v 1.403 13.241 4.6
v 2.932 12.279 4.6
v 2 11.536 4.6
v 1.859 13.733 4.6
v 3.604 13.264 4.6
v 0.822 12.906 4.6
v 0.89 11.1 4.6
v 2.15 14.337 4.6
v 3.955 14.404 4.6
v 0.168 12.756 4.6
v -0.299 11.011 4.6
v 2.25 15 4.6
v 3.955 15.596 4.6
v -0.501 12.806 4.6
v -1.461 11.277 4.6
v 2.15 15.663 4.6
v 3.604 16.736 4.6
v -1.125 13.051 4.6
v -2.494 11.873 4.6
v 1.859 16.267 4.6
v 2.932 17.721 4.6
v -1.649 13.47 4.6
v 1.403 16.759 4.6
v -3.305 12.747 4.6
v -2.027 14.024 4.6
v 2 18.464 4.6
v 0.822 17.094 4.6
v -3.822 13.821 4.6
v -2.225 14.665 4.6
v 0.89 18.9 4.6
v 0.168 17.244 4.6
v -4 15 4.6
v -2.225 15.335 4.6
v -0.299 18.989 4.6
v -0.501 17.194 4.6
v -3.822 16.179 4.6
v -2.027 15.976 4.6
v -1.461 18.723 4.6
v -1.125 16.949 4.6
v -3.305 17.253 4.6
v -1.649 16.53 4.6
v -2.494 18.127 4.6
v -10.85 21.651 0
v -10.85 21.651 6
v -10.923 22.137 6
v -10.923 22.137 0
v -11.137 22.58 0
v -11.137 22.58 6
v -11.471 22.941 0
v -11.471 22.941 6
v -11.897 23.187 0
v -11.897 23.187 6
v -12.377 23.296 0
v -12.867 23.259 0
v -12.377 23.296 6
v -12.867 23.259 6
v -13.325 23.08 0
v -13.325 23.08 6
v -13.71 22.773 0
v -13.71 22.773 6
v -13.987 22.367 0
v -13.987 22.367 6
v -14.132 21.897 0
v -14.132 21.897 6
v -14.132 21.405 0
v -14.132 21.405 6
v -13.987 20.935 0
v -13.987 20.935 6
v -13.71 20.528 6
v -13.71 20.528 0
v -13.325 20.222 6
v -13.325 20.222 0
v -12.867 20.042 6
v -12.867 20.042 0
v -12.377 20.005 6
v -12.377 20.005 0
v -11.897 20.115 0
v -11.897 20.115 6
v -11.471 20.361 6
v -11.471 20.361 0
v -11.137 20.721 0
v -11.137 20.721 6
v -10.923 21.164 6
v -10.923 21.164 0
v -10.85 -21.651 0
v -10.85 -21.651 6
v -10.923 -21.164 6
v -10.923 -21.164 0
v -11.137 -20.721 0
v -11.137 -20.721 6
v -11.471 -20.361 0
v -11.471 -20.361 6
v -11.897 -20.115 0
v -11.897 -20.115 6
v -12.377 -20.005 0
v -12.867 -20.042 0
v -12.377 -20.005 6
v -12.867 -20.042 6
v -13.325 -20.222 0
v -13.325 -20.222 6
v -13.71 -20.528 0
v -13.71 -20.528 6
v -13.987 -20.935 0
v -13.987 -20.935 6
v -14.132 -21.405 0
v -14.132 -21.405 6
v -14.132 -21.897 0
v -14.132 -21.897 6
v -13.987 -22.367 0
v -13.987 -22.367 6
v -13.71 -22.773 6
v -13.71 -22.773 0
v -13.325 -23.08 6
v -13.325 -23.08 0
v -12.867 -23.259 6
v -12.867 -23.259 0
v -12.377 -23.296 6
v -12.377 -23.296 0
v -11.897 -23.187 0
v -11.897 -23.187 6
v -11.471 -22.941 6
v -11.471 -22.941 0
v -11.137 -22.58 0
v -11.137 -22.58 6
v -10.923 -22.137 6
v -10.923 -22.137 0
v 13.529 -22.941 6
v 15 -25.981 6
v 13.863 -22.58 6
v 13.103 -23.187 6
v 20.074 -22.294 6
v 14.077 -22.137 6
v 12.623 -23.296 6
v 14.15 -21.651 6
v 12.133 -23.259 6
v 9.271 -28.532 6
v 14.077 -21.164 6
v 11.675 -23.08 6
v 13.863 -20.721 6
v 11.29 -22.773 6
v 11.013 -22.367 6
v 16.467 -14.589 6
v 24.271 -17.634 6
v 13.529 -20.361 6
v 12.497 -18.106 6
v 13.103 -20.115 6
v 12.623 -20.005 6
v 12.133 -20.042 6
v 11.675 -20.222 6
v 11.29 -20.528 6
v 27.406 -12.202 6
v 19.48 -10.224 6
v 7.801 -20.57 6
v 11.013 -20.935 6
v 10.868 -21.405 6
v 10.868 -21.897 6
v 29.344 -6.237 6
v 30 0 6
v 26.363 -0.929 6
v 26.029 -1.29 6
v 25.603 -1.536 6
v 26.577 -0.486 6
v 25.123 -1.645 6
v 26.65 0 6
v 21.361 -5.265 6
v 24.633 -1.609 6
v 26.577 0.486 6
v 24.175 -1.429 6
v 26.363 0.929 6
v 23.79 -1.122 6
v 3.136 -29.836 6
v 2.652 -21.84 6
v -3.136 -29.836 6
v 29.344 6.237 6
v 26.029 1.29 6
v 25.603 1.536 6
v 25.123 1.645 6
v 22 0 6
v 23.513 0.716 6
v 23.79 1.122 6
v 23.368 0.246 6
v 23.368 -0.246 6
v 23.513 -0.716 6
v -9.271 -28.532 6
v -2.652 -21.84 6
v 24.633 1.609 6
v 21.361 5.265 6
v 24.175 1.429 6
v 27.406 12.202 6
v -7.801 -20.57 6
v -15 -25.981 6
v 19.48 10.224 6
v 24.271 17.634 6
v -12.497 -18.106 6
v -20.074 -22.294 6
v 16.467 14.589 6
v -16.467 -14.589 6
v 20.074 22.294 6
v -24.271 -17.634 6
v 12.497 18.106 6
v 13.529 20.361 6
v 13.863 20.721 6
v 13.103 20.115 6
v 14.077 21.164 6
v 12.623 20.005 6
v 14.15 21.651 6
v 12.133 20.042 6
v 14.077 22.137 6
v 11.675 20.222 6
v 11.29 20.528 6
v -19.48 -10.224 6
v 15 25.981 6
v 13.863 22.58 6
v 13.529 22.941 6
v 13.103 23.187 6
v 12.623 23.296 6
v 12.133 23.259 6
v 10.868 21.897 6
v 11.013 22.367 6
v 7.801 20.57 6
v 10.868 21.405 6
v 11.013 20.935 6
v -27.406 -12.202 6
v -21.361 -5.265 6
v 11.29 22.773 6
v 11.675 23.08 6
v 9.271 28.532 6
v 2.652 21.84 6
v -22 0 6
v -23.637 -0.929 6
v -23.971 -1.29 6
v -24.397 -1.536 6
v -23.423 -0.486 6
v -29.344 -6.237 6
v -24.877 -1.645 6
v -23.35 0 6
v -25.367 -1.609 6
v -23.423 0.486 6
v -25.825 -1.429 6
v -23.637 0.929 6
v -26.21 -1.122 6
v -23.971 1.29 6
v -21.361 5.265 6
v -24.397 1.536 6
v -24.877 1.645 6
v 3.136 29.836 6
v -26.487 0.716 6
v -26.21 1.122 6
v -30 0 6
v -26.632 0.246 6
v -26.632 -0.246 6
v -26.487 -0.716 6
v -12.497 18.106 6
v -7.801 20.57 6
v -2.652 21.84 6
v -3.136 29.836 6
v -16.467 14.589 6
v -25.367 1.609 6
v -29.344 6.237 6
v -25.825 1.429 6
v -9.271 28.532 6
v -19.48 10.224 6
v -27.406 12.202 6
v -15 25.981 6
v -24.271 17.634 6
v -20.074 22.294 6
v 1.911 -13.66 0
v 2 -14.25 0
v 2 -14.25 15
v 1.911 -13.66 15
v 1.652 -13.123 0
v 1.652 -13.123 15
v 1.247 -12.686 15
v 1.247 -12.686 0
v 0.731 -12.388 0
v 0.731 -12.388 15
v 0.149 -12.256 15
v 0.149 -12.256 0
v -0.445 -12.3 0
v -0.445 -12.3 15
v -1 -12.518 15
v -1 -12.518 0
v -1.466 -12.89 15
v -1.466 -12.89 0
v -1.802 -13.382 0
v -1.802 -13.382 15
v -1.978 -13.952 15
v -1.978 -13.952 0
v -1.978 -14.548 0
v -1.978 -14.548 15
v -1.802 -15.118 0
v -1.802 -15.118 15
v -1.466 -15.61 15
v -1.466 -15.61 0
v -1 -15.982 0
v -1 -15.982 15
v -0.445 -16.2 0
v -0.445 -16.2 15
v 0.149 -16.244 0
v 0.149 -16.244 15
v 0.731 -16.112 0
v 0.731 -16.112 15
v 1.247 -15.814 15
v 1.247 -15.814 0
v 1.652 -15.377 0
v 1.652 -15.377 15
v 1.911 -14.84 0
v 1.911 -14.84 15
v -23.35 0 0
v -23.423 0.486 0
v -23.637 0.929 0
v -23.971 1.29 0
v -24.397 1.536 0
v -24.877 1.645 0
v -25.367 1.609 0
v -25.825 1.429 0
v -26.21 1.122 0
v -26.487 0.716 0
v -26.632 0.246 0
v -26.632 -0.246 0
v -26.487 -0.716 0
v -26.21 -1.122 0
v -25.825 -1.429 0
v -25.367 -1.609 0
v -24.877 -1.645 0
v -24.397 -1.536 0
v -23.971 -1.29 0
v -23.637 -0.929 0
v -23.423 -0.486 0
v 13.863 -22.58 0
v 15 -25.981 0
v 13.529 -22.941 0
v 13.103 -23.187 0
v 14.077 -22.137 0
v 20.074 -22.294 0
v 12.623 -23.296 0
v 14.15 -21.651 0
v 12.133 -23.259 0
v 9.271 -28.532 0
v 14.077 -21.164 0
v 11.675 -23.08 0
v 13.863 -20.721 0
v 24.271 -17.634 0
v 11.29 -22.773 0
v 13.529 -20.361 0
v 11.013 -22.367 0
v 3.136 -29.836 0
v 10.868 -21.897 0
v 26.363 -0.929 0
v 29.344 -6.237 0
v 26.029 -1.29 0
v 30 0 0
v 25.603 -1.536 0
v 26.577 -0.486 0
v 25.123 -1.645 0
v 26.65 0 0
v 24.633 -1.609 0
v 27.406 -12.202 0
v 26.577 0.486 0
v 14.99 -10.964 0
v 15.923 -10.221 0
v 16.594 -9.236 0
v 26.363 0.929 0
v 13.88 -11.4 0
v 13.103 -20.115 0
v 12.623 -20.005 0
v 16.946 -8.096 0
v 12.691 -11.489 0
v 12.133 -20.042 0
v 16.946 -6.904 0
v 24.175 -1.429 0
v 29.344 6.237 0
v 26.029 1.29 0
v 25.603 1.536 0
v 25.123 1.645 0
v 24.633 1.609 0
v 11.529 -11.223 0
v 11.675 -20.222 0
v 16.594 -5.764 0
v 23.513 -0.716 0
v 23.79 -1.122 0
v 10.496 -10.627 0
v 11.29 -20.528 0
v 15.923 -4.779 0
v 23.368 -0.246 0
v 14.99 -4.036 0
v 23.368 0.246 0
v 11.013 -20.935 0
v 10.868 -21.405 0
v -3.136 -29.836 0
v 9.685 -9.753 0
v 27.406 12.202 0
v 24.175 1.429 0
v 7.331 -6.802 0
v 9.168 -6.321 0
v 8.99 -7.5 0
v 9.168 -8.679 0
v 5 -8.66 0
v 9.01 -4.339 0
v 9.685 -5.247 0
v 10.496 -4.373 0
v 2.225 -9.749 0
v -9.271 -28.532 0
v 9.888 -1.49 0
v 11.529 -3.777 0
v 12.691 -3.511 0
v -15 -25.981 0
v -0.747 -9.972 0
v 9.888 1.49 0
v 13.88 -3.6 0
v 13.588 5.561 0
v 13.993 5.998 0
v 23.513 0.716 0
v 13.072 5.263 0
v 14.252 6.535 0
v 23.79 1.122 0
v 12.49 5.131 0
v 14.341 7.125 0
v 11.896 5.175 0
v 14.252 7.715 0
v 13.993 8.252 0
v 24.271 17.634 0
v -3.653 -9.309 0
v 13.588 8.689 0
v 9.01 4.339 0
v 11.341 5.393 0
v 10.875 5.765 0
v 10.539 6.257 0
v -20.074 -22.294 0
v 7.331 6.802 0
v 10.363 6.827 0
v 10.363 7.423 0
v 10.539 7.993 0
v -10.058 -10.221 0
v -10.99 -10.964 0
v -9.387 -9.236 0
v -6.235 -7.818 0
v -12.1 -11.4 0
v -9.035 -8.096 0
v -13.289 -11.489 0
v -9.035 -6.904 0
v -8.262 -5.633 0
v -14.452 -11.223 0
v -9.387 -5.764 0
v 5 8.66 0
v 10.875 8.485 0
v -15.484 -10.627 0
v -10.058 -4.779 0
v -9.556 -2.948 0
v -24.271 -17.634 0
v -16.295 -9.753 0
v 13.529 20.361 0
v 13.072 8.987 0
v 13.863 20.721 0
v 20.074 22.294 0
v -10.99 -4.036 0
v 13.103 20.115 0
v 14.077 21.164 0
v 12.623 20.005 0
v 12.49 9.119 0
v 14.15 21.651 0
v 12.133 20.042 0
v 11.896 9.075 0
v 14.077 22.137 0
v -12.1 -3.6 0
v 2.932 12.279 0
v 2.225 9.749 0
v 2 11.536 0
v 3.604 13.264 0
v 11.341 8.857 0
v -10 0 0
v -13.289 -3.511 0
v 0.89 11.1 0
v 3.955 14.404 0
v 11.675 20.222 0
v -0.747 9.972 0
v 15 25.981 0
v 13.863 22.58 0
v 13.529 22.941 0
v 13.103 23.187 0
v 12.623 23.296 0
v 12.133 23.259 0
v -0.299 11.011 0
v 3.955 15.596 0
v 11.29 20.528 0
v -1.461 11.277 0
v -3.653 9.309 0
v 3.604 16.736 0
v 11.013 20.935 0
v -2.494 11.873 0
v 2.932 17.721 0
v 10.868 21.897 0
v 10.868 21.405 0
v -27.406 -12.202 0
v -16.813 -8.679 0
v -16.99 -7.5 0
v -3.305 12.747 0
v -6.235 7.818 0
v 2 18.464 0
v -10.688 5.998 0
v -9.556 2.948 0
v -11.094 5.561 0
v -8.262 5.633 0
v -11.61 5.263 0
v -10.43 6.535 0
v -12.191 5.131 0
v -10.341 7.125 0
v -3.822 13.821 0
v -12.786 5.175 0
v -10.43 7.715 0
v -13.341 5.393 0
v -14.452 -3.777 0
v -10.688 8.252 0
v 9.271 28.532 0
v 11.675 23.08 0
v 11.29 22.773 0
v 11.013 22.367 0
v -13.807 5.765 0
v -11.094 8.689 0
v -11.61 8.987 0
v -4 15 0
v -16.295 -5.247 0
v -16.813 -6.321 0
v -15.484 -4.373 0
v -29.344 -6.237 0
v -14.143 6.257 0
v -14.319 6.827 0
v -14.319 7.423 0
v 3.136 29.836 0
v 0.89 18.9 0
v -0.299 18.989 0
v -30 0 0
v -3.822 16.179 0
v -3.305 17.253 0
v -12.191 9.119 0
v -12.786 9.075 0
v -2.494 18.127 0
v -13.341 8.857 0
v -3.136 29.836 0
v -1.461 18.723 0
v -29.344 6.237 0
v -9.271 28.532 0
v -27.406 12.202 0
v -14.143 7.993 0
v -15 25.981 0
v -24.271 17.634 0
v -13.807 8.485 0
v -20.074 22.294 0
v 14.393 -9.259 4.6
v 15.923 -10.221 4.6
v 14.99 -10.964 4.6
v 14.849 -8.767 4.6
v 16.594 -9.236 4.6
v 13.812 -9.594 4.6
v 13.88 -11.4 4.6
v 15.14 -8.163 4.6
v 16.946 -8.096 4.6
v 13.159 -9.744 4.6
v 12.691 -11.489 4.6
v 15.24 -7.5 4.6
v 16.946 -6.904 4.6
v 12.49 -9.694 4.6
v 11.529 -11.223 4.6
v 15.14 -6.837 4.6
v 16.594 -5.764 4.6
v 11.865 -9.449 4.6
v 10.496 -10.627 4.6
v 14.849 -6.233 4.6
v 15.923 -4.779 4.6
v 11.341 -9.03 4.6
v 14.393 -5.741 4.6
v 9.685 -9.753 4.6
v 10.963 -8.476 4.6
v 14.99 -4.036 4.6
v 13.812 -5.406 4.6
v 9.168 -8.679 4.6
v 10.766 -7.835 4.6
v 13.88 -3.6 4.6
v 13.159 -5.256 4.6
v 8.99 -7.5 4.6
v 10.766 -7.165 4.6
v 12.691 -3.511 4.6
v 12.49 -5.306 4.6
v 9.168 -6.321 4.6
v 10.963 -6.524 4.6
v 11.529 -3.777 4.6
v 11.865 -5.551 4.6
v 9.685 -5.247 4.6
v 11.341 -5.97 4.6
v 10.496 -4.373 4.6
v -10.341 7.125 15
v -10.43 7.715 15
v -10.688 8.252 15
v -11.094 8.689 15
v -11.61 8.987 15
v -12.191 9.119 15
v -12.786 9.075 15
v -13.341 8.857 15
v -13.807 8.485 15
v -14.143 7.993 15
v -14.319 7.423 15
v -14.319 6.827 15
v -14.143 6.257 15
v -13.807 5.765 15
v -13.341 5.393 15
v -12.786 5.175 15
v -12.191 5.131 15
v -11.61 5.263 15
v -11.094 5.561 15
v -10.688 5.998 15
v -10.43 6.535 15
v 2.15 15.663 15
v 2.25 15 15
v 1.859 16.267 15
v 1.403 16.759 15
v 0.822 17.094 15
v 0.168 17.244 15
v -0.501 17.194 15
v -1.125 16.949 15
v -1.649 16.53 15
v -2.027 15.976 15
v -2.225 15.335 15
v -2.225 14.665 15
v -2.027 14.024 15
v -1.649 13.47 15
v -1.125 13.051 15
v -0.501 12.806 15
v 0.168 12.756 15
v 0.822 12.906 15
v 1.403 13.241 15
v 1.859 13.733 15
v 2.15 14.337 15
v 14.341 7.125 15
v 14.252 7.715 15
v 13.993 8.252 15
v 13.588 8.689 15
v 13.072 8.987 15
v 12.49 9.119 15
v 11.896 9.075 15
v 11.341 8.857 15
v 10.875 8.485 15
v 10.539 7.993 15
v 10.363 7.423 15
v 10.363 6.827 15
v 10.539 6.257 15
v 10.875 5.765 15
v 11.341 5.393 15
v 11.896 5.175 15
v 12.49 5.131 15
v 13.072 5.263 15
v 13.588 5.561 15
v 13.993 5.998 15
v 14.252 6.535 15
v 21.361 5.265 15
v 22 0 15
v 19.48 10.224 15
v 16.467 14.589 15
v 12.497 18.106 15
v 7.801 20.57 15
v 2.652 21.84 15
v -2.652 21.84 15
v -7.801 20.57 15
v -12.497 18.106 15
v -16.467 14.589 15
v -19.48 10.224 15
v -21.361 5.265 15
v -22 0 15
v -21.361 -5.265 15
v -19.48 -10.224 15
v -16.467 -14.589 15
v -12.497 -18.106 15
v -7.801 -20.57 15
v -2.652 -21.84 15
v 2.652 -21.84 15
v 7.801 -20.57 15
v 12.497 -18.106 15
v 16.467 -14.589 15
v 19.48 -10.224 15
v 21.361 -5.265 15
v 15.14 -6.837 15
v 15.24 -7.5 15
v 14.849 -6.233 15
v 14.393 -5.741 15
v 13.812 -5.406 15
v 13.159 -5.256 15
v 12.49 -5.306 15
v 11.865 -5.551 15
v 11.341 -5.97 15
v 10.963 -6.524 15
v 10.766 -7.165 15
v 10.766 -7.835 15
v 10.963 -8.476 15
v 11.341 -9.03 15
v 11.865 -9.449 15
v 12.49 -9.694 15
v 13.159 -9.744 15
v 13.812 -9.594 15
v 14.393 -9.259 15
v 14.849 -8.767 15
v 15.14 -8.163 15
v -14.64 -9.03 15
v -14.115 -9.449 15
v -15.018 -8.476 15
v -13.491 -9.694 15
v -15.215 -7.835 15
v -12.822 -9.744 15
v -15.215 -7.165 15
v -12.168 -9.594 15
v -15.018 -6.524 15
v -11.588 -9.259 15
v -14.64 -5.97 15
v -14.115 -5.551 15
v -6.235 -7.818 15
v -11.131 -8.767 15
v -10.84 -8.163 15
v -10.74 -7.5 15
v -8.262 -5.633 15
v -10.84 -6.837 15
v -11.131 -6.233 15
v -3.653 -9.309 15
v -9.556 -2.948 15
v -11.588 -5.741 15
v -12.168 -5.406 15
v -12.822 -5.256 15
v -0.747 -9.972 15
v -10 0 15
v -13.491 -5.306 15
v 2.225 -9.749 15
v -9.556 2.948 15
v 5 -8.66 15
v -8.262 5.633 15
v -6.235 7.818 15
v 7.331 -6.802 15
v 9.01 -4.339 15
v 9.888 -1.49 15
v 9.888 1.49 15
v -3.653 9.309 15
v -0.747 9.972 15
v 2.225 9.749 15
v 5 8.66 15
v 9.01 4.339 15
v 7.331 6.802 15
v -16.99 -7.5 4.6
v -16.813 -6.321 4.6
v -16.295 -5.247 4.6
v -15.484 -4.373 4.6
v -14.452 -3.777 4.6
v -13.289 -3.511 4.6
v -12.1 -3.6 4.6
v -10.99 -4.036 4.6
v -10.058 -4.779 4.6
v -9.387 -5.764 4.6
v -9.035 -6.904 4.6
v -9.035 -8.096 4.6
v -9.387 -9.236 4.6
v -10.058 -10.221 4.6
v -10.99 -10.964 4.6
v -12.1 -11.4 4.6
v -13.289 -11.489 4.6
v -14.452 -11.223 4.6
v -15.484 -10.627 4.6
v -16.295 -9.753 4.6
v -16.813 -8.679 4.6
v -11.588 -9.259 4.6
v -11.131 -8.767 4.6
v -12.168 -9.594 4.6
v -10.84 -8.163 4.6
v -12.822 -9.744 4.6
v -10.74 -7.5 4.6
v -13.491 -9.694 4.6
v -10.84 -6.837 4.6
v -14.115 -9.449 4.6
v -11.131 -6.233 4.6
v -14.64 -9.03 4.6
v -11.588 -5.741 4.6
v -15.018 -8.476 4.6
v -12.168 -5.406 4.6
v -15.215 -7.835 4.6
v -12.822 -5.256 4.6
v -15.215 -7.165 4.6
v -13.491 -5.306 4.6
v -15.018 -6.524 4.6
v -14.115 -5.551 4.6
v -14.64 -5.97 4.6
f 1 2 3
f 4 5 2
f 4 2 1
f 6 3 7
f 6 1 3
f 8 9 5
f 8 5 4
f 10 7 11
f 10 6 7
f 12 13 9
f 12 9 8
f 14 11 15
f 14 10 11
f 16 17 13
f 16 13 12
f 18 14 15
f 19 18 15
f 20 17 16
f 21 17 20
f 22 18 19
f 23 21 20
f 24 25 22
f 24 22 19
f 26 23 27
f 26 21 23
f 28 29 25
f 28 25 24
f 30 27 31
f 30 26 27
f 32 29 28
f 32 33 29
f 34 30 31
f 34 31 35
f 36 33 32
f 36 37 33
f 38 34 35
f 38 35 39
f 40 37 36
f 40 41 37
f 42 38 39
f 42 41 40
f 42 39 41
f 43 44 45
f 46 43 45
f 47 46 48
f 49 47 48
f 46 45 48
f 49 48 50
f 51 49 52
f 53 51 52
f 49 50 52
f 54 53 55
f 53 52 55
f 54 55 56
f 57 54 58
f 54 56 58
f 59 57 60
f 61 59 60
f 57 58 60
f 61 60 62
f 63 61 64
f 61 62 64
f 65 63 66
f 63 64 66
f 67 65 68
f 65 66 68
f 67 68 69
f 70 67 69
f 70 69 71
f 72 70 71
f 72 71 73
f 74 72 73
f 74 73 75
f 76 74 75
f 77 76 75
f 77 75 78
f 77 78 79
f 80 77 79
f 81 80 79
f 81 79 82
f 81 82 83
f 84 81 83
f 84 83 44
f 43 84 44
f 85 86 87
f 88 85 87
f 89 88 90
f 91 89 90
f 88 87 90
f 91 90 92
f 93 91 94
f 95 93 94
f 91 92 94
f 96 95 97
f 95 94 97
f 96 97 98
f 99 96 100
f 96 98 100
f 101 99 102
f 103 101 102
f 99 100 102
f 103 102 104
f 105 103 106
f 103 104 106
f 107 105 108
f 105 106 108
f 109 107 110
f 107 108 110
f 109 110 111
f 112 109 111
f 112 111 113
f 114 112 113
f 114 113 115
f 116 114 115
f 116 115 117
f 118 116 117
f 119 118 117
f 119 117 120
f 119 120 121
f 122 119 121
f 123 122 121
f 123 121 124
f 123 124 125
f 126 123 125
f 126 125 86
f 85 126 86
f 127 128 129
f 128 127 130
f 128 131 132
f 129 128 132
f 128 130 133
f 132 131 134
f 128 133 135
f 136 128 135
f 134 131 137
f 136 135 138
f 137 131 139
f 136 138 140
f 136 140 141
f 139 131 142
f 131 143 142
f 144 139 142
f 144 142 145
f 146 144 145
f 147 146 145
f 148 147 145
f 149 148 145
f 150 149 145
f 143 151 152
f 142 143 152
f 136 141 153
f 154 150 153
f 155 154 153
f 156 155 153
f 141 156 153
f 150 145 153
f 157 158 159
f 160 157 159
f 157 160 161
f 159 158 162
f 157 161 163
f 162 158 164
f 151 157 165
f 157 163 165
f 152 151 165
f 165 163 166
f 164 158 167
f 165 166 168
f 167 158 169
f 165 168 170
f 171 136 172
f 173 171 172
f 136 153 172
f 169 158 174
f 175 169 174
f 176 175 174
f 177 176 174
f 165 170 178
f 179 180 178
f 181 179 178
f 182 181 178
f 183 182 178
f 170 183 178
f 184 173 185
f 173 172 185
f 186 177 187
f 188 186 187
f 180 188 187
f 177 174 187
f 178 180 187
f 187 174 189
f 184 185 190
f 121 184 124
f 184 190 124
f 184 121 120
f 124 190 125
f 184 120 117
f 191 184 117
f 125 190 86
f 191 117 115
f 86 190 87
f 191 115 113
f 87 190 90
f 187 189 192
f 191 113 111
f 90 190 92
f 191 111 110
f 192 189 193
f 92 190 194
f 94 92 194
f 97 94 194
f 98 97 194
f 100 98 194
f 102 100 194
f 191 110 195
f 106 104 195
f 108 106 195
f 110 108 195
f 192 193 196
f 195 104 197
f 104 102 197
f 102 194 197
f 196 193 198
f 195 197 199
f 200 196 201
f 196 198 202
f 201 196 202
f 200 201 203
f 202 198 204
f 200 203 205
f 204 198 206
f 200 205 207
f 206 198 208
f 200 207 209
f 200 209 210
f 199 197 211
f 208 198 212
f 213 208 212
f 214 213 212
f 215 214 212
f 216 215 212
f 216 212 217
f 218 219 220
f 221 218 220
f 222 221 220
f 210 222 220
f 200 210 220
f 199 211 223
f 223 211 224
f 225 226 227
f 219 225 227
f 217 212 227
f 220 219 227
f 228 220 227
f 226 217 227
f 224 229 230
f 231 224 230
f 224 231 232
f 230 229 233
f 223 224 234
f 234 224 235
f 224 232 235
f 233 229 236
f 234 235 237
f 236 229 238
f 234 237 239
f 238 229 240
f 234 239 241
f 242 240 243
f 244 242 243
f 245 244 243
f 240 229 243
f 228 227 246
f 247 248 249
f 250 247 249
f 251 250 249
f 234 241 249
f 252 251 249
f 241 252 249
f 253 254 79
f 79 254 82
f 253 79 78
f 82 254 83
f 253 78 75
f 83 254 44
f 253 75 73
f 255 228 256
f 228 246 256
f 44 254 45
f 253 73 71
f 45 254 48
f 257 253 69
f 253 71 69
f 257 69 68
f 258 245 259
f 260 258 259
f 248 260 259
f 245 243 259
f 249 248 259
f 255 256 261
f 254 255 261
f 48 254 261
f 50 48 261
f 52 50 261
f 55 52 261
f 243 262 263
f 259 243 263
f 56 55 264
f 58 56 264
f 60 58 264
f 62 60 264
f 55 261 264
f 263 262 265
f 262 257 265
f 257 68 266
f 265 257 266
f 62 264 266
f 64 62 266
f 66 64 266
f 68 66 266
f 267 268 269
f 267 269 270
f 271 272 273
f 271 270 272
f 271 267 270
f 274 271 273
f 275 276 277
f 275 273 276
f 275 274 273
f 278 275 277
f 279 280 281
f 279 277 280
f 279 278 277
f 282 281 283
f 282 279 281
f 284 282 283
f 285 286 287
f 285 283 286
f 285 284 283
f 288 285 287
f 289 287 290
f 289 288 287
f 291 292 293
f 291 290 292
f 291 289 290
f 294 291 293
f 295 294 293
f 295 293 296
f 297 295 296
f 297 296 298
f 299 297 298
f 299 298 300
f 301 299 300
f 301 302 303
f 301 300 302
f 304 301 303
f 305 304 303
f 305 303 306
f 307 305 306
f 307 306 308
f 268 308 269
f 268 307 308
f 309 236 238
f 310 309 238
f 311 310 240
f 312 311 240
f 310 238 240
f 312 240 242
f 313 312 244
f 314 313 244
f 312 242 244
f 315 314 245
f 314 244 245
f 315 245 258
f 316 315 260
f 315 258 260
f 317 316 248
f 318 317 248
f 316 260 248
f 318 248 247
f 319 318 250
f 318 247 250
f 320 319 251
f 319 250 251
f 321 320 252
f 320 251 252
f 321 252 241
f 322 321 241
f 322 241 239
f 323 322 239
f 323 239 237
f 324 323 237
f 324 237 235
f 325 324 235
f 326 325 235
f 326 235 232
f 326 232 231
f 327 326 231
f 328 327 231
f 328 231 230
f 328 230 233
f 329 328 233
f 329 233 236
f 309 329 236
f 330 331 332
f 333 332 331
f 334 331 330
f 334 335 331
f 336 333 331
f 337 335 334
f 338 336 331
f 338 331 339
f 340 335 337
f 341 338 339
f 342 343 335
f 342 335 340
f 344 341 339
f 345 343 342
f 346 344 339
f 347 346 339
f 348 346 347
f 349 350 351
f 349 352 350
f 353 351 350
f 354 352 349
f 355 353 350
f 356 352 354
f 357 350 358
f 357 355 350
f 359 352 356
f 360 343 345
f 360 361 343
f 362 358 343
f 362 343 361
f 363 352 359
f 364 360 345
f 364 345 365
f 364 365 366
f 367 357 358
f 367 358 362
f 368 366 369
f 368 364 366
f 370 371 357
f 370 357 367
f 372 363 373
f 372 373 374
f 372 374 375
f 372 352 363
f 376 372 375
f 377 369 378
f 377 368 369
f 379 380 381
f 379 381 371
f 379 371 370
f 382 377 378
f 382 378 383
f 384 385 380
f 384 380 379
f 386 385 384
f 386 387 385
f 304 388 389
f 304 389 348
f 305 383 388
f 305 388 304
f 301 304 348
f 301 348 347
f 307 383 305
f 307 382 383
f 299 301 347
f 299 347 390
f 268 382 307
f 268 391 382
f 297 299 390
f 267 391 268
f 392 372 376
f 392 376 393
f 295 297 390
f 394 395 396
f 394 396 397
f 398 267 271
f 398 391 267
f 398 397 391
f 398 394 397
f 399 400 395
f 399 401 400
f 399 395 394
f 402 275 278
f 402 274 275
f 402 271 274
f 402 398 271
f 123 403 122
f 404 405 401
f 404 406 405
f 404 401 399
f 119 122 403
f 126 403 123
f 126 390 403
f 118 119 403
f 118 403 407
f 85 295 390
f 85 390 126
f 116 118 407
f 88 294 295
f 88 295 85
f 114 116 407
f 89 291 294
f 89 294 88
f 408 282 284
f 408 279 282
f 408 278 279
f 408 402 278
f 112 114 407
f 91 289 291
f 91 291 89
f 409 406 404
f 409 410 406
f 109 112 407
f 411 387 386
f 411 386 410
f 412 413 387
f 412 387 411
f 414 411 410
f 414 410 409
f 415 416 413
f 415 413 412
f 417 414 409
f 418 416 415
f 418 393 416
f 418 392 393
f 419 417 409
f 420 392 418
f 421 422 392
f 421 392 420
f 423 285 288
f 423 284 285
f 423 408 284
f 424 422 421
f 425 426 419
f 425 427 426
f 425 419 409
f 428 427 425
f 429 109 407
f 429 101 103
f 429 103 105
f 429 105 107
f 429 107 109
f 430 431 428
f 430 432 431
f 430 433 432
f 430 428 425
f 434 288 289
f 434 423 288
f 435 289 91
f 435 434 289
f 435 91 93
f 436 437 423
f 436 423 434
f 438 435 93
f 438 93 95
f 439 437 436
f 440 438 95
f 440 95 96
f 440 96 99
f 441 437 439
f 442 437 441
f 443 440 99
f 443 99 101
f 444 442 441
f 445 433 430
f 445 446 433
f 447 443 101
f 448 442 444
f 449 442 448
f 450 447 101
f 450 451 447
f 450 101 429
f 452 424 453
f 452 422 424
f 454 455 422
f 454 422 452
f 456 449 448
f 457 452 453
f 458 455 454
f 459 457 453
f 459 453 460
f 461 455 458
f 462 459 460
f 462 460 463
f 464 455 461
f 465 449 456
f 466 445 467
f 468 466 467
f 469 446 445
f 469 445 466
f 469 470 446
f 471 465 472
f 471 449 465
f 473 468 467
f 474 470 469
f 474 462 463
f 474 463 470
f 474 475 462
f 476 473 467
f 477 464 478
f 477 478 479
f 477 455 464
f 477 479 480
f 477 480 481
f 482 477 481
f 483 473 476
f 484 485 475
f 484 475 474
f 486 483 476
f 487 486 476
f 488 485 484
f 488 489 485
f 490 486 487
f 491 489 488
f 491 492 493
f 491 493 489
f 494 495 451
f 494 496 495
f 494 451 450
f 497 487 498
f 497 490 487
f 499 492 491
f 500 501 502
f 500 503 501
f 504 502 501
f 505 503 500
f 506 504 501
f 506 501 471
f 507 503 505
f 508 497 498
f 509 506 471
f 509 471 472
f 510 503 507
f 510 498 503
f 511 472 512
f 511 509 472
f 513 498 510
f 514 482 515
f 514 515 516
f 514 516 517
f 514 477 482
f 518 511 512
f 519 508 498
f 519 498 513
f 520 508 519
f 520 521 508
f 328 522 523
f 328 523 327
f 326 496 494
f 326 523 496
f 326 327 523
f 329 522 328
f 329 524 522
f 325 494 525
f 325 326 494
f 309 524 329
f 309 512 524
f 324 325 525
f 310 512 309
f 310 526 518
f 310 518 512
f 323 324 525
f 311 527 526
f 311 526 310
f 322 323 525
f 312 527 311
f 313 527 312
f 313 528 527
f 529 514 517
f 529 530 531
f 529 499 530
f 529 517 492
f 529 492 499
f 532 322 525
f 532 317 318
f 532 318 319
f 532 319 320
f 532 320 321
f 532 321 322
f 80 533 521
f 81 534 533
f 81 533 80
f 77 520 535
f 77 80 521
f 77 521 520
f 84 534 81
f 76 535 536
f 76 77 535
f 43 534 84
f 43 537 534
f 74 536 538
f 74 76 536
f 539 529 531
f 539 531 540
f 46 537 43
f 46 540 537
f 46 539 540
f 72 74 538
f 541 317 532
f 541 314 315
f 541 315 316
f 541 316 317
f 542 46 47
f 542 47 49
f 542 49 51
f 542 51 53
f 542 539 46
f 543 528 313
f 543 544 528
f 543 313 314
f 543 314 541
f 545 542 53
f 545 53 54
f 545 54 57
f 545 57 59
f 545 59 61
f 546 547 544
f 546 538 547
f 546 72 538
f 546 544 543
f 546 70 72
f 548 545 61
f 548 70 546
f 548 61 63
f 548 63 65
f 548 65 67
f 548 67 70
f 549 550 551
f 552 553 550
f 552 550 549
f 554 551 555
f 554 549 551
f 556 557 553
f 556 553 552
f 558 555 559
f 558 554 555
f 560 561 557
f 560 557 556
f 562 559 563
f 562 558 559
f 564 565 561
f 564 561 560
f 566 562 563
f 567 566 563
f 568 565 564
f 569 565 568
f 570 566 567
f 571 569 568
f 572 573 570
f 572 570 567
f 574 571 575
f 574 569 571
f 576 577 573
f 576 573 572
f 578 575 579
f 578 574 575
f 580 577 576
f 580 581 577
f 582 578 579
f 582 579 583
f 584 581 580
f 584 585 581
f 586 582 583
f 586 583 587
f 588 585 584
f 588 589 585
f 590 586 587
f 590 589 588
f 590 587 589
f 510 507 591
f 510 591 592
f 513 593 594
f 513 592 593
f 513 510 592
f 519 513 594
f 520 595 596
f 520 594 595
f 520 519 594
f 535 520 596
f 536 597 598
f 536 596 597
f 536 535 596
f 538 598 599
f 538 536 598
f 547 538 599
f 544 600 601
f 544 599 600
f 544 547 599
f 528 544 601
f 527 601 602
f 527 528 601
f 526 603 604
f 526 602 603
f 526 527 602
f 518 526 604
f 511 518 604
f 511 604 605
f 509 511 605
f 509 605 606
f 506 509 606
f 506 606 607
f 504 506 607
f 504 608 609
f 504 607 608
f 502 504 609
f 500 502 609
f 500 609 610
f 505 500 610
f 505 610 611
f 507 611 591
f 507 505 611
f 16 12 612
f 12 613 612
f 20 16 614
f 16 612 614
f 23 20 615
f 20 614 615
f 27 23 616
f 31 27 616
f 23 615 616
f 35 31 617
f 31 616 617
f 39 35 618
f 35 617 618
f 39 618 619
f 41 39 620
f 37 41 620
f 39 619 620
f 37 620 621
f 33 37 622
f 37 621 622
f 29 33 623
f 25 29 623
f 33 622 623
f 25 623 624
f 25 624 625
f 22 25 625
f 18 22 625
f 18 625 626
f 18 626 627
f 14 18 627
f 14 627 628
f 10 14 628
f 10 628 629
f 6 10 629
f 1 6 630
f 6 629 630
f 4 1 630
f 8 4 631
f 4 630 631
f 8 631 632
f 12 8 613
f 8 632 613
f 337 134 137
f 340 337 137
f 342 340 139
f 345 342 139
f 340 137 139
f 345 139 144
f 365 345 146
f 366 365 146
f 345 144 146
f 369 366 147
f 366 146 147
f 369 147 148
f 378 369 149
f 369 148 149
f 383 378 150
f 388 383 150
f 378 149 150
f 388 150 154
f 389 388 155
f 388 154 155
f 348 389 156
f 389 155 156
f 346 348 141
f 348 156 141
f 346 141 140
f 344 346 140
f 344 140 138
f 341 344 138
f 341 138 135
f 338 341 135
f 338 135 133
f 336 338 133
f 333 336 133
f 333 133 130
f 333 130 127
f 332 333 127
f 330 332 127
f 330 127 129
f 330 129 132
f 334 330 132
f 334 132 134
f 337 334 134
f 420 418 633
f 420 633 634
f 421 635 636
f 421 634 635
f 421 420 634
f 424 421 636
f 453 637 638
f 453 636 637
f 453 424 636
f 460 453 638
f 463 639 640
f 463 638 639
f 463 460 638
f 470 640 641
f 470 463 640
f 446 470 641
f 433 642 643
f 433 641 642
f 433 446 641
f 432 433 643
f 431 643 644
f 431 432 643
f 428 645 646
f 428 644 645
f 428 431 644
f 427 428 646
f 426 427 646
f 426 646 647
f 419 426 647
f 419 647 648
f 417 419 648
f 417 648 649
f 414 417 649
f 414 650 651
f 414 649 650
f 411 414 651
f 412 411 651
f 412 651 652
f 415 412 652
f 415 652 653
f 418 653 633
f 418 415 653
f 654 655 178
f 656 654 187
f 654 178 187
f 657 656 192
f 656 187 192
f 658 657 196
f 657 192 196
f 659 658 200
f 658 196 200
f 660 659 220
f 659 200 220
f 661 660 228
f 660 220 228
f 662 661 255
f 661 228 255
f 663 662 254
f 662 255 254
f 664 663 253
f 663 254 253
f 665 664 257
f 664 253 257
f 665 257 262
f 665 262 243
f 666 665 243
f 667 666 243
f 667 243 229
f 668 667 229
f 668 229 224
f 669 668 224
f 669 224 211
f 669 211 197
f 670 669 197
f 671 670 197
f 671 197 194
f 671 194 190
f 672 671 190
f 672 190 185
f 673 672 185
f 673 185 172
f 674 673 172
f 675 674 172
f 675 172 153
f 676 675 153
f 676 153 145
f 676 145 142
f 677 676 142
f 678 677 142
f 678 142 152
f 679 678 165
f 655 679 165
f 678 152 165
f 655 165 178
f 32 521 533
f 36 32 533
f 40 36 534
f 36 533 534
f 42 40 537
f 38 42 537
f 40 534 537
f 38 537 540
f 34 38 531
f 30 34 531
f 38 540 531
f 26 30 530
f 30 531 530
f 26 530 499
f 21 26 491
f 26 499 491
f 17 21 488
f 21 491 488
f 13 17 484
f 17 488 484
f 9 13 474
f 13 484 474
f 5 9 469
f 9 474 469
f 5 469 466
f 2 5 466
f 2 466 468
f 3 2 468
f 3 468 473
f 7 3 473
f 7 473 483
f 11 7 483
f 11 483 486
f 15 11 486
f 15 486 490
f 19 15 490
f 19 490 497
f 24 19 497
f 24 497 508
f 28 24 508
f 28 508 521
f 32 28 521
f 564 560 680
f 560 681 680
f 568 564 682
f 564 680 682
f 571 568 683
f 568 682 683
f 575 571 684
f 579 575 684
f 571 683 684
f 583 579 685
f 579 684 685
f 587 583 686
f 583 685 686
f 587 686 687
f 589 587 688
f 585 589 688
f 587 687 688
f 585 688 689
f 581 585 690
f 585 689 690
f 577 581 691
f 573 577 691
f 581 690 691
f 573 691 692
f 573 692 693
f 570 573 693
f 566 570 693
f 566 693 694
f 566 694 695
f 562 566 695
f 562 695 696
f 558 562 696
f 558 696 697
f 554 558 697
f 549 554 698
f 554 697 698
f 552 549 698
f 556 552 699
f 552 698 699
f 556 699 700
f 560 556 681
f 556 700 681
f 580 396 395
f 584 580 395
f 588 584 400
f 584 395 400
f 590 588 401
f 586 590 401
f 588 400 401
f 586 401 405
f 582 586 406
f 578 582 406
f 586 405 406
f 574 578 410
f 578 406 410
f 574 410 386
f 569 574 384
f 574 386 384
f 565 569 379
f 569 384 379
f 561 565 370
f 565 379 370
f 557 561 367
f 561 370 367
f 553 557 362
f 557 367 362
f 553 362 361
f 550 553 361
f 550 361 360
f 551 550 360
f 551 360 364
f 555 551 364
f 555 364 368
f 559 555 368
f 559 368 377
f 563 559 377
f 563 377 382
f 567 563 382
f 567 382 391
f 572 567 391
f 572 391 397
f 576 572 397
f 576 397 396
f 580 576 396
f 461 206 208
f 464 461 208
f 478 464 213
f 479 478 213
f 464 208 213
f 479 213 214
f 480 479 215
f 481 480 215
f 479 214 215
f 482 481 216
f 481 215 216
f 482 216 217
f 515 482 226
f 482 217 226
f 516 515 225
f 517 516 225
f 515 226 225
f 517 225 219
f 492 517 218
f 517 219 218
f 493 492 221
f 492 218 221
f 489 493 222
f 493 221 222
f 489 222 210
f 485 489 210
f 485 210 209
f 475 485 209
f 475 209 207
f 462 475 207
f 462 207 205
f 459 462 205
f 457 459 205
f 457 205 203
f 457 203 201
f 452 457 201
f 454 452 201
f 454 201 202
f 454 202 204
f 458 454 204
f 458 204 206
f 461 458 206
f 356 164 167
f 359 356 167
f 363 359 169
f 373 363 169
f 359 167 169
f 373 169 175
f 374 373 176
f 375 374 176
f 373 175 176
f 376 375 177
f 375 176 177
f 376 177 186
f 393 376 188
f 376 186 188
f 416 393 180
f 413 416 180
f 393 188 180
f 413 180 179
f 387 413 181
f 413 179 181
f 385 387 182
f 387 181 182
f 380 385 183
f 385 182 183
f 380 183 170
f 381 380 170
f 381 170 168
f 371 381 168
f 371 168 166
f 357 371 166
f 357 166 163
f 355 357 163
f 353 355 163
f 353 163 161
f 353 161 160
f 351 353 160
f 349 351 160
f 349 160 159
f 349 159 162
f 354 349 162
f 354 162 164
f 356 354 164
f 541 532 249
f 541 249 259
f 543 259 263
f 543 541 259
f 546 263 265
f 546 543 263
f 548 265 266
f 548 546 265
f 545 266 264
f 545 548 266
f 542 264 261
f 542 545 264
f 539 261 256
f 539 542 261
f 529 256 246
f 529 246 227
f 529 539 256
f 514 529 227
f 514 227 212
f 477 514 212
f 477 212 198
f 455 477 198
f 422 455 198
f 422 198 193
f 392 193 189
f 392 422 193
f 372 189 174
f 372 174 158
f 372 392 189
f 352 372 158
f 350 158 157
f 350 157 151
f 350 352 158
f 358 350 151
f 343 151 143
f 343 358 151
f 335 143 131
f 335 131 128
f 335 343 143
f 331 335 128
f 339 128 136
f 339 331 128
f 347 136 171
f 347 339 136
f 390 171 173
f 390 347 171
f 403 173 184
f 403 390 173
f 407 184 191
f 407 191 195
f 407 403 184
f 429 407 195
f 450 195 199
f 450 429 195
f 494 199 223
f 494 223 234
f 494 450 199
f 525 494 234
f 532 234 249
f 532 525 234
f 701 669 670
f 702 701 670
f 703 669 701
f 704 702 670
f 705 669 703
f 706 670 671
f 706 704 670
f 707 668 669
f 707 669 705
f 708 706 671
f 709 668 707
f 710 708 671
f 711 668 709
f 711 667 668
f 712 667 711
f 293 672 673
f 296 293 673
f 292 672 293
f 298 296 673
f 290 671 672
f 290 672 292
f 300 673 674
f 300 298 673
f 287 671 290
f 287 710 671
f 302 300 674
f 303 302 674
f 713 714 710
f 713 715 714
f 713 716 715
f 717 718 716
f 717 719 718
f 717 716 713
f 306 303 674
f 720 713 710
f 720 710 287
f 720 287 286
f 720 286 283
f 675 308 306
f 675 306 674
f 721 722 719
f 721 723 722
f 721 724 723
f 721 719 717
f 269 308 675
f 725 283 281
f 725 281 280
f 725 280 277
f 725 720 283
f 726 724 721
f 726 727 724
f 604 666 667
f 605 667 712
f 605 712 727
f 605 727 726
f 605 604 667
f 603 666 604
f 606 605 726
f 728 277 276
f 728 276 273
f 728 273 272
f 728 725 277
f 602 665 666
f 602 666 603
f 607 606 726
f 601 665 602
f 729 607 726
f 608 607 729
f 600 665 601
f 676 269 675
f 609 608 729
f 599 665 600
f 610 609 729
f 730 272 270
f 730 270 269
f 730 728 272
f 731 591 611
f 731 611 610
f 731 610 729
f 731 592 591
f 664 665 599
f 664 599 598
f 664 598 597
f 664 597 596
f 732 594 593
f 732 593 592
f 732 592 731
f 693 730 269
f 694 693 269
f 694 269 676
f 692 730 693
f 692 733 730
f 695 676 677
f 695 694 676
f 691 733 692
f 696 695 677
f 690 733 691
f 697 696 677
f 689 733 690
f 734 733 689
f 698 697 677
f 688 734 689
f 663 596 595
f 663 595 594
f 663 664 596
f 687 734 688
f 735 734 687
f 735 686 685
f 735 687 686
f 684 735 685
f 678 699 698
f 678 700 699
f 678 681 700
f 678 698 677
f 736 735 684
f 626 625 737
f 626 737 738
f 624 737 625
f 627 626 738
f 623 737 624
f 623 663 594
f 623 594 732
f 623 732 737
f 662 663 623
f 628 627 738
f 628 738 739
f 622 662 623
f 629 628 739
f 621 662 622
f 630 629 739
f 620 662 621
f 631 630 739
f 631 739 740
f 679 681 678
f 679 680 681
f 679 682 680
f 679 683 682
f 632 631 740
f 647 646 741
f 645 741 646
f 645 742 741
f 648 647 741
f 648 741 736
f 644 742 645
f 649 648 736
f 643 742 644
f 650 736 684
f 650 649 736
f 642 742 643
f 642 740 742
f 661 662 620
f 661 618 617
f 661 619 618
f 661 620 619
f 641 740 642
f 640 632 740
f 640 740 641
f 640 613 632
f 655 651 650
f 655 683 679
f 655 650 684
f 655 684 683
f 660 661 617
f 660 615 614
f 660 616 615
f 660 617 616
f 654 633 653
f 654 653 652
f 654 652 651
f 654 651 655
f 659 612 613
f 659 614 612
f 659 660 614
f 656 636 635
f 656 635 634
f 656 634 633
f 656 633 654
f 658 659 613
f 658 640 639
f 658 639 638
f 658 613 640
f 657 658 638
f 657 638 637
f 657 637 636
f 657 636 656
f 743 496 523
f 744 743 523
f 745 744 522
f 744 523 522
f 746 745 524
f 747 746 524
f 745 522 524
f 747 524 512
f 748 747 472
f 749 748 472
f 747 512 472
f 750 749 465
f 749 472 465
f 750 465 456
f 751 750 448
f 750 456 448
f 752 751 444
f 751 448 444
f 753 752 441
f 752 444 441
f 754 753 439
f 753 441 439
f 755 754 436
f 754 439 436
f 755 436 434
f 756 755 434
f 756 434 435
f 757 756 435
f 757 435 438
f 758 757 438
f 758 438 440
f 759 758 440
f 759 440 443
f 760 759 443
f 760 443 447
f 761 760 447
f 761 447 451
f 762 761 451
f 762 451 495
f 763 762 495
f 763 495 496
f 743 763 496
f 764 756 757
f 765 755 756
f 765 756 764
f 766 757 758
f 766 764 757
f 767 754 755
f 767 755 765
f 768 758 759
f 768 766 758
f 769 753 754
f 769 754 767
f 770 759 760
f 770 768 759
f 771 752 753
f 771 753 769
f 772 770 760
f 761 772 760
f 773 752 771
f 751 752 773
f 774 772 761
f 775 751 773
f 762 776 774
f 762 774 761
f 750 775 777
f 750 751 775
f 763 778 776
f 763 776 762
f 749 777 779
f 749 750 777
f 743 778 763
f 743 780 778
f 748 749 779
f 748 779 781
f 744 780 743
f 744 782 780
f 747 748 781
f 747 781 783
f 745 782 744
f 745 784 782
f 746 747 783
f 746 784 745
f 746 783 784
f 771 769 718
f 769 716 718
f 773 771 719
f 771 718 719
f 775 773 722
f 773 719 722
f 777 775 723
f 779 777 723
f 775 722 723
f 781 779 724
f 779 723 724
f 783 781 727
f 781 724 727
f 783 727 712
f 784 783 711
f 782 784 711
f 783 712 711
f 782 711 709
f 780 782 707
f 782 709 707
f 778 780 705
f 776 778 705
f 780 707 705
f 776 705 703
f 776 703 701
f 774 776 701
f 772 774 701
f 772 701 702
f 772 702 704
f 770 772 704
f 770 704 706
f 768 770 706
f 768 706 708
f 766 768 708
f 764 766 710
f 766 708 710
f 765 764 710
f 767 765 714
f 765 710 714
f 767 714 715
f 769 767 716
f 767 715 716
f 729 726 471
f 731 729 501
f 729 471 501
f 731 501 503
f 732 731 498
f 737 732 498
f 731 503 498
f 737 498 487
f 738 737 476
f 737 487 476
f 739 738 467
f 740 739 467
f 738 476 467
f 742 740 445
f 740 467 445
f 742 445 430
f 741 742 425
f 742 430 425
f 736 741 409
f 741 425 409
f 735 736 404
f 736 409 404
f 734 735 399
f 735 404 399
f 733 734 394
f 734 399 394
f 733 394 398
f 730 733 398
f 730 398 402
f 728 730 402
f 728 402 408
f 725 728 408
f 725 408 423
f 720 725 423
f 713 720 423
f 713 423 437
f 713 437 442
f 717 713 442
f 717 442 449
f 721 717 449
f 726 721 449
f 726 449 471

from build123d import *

# Parameters (mm, degrees)
SKETCH_1_R                = 22
EXTRUDE_1_DEPTH           = 15
SKETCH_6_R                = 30
EXTRUDE_2_DEPTH           = 6
CUT_EXTRUDE_1_DEPTH       = 46
CUT_EXTRUDE_1_DEPTH_BACK  = 46
SKETCH_2_R                = 2
SKETCH_3_R                = 10
CUT_EXTRUDE_2_DEPTH       = 46
HOLE_WIZARD_1_D           = 4.5
HOLE_WIZARD_1_CBORE_D     = 8
HOLE_WIZARD_1_CBORE_DEPTH = 4.6
HOLE_WIZARD_M4_1_D        = 3.3


with BuildPart() as part:
    # 草图1 → 凸台-拉伸1 (new body)
    with BuildSketch(Plane.XY):
        Circle(SKETCH_1_R)
    extrude(amount=EXTRUDE_1_DEPTH)

    # 草图6 → 凸台-拉伸2 (add)
    with BuildSketch(Plane(origin=(0, 0, 0), x_dir=(-1, 0, 0), z_dir=(0, 0, -1))):
        Circle(SKETCH_6_R)
    extrude(amount=-EXTRUDE_2_DEPTH)

    # 草图2 → 切除-拉伸1 (cut, two sides: drawn at the far end of the back side and taken through both)
    with BuildSketch(Plane.XY.offset(15).offset(-CUT_EXTRUDE_1_DEPTH_BACK)):
        with Locations((-12.340862004, 7.125)):
            Circle(SKETCH_2_R)
        with Locations((12.340862004, 7.125)):
            Circle(SKETCH_2_R)
        with Locations((0, -14.25)):
            Circle(SKETCH_2_R)
    extrude(amount=CUT_EXTRUDE_1_DEPTH + CUT_EXTRUDE_1_DEPTH_BACK, mode=Mode.SUBTRACT)

    # 草图3 → 切除-拉伸2 (cut, through all)
    with BuildSketch(Plane(origin=(0, 0, 0), x_dir=(-1, 0, 0), z_dir=(0, 0, -1))):
        Circle(SKETCH_3_R)
    extrude(amount=-CUT_EXTRUDE_2_DEPTH, mode=Mode.SUBTRACT)

    # 打孔尺寸(%根据)内六角圆柱头螺钉的类型1 (through all)
    with Locations(Plane(origin=(12.990381057, -7.5, 0), x_dir=(-1, 0, 0), z_dir=(0, 0, -1))):
        with Locations((0, 0), (25.980762114, 0), (12.990381057, 22.5)):
            CounterBoreHole(HOLE_WIZARD_1_D / 2, HOLE_WIZARD_1_CBORE_D / 2, HOLE_WIZARD_1_CBORE_DEPTH)

    # M4 螺纹孔1 (through all)
    with Locations(Plane(origin=(25, 0, 0), x_dir=(-1, 0, 0), z_dir=(0, 0, -1))):
        with Locations((0, 0), (12.5, 21.650635095), (37.5, 21.650635095), (50, 0), (37.5, -21.650635095), (12.5, -21.650635095)):
            Hole(HOLE_WIZARD_M4_1_D / 2)


solid = part.part
